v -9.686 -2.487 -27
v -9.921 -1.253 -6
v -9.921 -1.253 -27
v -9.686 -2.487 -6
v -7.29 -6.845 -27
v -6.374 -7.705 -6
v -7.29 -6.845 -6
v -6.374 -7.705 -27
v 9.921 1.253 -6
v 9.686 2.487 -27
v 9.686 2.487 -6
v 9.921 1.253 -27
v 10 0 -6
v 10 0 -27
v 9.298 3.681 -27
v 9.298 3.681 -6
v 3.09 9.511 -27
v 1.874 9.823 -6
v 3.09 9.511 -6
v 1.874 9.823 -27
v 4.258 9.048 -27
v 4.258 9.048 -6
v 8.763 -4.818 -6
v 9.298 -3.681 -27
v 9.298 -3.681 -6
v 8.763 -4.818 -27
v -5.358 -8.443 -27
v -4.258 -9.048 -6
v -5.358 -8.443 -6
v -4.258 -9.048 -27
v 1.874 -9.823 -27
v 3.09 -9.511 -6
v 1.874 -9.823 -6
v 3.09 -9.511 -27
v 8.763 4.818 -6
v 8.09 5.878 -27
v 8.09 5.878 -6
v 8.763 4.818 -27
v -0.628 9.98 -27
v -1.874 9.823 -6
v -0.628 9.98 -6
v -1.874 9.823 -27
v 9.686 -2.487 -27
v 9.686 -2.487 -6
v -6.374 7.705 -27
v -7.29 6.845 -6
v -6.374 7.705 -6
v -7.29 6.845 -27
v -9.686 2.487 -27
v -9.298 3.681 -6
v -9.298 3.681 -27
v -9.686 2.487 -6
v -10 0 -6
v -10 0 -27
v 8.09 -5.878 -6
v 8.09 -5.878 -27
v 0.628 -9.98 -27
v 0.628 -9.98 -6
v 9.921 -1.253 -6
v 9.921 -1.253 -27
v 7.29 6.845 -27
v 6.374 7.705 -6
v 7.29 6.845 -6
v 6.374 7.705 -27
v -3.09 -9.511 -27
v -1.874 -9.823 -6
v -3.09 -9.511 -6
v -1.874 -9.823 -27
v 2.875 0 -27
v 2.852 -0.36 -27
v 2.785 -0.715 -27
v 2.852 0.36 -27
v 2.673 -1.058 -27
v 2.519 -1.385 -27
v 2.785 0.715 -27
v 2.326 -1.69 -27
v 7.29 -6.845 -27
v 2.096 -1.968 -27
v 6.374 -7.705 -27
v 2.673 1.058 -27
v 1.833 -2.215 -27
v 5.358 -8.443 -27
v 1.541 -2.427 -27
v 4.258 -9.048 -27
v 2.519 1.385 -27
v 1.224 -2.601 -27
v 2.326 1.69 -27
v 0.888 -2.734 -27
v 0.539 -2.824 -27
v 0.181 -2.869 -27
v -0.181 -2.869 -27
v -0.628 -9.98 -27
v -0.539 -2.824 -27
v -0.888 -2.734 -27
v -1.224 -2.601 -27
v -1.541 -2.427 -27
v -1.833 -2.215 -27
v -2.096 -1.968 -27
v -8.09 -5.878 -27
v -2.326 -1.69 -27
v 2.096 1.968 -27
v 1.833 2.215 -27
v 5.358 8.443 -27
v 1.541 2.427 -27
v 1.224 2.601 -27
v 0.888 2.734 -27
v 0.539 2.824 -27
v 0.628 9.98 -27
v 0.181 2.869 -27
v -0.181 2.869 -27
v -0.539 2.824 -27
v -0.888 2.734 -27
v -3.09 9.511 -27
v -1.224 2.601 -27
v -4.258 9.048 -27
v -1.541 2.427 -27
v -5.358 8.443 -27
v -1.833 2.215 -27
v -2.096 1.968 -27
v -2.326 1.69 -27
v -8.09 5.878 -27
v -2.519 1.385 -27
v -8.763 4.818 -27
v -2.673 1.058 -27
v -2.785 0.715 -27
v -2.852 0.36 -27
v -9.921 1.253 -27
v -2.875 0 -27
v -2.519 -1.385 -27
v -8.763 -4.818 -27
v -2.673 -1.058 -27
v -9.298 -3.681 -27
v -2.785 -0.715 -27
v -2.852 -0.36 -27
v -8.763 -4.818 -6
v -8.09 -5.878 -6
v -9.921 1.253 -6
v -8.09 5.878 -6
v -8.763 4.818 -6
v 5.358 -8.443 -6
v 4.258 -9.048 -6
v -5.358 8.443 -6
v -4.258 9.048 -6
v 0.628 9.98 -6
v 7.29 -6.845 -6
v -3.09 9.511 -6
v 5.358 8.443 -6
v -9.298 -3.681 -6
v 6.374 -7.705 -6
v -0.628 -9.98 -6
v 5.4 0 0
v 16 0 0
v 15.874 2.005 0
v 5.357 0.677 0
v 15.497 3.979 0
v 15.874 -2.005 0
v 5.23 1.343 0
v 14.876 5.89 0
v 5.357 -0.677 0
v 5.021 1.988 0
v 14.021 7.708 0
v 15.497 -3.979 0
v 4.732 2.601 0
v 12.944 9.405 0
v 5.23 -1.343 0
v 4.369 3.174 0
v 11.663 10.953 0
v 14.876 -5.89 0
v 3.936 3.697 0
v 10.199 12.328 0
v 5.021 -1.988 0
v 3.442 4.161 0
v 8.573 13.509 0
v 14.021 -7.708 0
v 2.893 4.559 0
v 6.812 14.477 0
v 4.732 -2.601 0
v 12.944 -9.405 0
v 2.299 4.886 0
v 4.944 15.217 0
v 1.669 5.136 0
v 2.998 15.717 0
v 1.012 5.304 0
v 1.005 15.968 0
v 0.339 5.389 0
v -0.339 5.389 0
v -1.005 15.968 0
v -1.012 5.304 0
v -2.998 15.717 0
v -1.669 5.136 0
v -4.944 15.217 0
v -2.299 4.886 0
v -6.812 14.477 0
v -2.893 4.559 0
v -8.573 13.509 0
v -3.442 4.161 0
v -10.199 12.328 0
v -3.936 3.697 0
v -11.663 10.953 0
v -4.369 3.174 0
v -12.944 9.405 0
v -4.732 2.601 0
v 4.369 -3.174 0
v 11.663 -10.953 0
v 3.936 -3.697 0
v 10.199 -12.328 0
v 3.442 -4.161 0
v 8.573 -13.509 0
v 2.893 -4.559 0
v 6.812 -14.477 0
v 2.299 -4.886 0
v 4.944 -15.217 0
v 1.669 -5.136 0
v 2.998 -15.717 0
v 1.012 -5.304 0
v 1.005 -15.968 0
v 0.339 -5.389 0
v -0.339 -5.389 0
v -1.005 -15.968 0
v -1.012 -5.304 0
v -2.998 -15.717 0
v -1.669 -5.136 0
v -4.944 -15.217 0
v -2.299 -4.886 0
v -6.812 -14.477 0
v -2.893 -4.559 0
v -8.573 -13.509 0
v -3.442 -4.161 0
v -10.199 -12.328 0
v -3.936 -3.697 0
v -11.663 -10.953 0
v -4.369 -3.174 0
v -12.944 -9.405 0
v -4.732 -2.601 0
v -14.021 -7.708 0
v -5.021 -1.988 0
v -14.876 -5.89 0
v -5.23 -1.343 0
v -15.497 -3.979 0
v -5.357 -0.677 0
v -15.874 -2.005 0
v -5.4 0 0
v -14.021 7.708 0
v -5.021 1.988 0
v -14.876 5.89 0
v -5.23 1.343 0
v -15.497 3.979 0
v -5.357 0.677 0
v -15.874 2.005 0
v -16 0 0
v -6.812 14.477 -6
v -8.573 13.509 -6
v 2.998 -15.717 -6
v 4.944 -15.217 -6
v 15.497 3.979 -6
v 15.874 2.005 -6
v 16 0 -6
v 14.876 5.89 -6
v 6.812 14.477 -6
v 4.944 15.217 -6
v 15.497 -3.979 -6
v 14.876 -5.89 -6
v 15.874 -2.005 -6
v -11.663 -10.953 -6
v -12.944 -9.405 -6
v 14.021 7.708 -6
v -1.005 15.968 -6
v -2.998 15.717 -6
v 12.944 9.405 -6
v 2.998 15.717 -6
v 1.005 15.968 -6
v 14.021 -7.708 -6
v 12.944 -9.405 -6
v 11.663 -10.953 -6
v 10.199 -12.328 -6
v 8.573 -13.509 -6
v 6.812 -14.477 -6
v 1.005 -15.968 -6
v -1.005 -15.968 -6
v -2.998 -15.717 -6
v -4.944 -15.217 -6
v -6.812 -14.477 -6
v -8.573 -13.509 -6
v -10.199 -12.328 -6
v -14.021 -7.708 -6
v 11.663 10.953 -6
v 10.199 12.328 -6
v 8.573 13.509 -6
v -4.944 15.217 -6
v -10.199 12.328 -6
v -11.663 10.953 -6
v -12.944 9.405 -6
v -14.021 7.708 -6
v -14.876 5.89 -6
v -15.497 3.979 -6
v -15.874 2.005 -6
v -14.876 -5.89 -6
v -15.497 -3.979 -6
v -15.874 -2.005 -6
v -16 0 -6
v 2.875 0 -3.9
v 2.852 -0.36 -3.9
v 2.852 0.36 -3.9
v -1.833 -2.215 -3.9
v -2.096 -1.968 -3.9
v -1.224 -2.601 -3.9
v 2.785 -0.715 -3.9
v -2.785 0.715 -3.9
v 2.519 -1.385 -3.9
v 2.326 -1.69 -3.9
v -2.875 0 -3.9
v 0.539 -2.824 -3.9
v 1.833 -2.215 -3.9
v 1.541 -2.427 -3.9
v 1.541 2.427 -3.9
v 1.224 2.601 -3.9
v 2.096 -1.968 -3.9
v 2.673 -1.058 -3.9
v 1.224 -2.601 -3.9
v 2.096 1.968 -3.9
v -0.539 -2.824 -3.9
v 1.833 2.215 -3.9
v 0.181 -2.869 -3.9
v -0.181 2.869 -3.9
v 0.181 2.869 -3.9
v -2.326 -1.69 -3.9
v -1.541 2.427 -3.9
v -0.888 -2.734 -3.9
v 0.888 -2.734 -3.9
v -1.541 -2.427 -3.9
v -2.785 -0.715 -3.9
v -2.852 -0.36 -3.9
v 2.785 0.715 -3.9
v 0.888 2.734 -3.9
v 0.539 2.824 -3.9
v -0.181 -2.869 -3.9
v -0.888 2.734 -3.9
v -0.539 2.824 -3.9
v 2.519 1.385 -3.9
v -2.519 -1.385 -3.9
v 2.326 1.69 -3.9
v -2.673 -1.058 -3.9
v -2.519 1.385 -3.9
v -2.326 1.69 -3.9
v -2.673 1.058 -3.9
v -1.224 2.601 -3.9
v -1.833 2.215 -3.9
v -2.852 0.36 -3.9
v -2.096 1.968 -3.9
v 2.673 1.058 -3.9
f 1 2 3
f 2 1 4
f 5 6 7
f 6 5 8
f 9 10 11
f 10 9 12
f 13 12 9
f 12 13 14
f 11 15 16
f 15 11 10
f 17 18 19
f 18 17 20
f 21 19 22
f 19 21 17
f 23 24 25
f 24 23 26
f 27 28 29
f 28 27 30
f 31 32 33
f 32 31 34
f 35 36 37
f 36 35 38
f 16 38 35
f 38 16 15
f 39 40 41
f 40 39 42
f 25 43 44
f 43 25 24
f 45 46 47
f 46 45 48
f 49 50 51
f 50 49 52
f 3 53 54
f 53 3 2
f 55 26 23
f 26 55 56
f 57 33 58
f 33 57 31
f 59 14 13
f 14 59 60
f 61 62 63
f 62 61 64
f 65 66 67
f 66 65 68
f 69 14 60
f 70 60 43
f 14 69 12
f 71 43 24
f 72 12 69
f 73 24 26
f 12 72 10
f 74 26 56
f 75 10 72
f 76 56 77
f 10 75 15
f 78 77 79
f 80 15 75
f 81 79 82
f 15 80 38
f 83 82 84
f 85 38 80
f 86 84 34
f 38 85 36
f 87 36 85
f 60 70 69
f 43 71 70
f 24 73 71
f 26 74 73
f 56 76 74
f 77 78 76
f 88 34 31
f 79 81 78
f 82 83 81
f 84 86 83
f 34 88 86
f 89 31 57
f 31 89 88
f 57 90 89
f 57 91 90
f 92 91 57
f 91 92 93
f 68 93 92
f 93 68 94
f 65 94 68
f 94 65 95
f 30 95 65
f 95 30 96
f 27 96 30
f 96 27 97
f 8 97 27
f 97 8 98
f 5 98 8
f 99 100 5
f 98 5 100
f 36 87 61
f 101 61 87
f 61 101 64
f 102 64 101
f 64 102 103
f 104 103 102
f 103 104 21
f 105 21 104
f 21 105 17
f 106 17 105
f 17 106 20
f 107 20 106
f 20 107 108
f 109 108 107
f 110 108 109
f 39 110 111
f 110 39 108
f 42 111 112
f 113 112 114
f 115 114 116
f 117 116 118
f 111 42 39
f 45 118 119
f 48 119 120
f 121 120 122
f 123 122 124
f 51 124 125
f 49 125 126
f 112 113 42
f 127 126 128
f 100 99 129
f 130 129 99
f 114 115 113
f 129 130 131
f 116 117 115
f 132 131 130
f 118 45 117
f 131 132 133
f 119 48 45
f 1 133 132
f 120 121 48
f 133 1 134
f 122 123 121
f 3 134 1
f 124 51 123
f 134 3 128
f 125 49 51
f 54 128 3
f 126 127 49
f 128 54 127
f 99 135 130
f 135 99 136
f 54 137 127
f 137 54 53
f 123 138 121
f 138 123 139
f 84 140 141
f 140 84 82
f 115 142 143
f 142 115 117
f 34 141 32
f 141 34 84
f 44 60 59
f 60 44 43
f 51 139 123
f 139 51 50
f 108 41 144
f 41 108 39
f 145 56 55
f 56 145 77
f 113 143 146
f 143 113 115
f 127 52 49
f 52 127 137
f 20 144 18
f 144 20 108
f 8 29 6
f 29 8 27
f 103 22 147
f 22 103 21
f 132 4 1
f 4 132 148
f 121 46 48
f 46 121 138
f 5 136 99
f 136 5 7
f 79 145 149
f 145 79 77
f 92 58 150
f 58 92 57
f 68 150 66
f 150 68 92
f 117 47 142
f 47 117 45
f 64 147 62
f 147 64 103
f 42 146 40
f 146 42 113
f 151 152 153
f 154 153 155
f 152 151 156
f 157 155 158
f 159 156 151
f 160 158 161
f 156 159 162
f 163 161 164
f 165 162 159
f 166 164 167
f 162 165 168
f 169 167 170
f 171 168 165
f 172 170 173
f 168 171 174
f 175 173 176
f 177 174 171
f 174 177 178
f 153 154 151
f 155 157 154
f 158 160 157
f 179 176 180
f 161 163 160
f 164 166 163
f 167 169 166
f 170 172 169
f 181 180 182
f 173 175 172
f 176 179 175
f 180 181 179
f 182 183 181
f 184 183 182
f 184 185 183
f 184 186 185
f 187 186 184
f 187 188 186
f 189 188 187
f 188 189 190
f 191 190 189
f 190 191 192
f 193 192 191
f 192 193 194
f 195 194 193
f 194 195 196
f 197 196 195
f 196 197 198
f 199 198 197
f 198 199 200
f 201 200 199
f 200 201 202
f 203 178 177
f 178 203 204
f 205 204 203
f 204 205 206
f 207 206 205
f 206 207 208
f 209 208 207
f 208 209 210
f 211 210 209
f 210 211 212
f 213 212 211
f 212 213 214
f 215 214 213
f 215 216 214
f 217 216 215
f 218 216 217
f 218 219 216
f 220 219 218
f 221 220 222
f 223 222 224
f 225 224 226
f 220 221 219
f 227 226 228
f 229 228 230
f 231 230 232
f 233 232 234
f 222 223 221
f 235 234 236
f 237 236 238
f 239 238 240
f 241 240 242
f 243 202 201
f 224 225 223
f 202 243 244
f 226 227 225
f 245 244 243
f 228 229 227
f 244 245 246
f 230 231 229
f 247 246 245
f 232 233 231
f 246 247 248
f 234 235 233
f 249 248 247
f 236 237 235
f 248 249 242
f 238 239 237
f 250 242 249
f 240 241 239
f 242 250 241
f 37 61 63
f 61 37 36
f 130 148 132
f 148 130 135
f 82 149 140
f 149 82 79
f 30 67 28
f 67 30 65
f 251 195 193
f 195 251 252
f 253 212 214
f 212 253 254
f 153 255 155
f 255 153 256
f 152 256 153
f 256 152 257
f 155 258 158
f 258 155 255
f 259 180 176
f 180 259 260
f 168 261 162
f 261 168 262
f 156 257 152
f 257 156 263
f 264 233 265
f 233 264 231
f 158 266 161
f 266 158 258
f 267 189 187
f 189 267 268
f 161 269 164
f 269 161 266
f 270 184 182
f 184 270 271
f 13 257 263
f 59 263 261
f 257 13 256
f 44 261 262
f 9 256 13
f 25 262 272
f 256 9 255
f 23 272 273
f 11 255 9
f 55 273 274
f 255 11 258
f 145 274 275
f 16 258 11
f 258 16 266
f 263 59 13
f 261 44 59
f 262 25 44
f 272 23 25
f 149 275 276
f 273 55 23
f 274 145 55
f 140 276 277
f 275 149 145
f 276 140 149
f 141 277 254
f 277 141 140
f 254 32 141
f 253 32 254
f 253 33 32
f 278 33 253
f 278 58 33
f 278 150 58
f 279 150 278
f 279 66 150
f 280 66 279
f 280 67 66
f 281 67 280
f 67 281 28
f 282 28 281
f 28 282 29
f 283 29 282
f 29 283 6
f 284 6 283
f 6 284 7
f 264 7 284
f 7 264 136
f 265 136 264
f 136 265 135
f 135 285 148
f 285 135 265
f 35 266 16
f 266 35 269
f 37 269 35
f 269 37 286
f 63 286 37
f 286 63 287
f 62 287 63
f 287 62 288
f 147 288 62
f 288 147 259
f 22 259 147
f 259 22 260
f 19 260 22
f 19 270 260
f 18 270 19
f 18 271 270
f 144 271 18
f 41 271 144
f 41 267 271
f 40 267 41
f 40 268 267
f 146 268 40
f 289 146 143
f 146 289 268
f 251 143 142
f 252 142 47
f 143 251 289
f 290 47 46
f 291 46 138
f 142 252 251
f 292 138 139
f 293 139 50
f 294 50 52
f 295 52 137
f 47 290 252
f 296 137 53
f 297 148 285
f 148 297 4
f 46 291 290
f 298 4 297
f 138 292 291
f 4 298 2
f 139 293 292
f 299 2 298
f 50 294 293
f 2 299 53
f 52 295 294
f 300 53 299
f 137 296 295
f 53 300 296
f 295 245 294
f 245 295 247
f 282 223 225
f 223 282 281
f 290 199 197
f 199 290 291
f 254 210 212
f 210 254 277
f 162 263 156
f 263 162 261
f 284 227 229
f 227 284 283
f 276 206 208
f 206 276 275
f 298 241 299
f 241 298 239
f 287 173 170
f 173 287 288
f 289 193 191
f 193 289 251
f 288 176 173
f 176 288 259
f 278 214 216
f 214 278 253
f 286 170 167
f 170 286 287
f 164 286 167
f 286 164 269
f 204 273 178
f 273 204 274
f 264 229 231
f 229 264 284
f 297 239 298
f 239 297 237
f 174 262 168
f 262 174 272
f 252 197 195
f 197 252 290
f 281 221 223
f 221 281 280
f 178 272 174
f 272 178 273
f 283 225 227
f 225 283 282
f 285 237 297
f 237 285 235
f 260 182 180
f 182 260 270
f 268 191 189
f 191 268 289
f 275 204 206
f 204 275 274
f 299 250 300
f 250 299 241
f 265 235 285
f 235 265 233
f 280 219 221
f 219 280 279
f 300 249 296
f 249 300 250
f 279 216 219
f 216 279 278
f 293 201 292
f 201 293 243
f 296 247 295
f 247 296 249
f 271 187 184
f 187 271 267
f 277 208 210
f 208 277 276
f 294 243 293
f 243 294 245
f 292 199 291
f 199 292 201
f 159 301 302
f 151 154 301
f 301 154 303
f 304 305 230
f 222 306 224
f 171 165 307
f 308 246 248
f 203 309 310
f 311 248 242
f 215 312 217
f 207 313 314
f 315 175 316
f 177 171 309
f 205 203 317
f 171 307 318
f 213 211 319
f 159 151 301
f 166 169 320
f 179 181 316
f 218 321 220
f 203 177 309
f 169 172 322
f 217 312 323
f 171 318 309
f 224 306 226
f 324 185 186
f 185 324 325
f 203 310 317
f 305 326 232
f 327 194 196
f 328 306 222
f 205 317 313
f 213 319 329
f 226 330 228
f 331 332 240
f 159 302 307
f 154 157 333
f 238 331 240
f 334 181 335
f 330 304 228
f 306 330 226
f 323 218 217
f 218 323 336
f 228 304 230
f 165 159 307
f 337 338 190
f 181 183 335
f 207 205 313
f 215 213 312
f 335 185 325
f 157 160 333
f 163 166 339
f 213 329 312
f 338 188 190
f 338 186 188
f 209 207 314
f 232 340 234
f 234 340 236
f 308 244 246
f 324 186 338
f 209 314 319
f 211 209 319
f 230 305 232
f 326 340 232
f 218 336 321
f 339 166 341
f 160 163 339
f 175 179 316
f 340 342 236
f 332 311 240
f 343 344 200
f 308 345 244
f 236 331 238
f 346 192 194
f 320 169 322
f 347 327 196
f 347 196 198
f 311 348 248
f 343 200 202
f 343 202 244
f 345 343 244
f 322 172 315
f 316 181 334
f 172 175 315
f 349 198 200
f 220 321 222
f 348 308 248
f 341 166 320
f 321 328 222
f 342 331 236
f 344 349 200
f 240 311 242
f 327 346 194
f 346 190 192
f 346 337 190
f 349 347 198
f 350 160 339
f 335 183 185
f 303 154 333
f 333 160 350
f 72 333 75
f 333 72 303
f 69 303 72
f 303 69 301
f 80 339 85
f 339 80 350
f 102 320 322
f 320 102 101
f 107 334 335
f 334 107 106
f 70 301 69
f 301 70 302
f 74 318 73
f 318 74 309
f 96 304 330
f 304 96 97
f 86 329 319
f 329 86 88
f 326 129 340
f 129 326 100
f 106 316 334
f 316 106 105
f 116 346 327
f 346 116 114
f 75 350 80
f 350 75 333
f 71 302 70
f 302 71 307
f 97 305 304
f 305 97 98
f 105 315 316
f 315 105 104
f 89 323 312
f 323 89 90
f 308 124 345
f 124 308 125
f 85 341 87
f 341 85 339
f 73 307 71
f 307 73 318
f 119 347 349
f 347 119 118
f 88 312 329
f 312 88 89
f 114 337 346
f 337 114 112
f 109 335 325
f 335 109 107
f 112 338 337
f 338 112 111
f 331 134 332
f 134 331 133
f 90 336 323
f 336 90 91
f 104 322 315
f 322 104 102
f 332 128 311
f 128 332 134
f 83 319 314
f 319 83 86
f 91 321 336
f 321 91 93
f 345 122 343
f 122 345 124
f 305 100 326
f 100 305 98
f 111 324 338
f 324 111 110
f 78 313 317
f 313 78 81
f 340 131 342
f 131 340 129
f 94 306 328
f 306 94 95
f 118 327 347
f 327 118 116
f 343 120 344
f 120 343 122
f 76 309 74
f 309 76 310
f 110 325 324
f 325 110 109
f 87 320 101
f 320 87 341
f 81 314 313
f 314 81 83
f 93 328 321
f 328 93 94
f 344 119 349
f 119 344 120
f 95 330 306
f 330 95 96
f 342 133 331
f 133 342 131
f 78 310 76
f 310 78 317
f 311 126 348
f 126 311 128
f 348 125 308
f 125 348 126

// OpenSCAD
$fn = 50;


difference() {
	union() {
		translate(v = [0, 0, -27.0000000000]) {
			cylinder(h = 27, r = 10.0000000000);
		}
		translate(v = [0, 0, -6.0000000000]) {
			cylinder(h = 6, r = 16.0000000000);
		}
	}
	union() {
		translate(v = [0, 0, 0]) {
			rotate(a = [0, 0, 0]) {
				difference() {
					union() {
						#translate(v = [0, 0, -27.0000000000]) {
							cylinder(h = 27, r = 2.6000000000);
						}
						#translate(v = [0, 0, -3.9000000000]) {
							cylinder(h = 3.9000000000, r1 = 2.8750000000, r2 = 5.4000000000);
						}
						#translate(v = [0, 0, -27.0000000000]) {
							cylinder(h = 27, r = 2.8750000000);
						}
						#translate(v = [0, 0, -27.0000000000]) {
							cylinder(h = 27, r = 2.6000000000);
						}
					}
					union();
				}
			}
		}
	}
}
